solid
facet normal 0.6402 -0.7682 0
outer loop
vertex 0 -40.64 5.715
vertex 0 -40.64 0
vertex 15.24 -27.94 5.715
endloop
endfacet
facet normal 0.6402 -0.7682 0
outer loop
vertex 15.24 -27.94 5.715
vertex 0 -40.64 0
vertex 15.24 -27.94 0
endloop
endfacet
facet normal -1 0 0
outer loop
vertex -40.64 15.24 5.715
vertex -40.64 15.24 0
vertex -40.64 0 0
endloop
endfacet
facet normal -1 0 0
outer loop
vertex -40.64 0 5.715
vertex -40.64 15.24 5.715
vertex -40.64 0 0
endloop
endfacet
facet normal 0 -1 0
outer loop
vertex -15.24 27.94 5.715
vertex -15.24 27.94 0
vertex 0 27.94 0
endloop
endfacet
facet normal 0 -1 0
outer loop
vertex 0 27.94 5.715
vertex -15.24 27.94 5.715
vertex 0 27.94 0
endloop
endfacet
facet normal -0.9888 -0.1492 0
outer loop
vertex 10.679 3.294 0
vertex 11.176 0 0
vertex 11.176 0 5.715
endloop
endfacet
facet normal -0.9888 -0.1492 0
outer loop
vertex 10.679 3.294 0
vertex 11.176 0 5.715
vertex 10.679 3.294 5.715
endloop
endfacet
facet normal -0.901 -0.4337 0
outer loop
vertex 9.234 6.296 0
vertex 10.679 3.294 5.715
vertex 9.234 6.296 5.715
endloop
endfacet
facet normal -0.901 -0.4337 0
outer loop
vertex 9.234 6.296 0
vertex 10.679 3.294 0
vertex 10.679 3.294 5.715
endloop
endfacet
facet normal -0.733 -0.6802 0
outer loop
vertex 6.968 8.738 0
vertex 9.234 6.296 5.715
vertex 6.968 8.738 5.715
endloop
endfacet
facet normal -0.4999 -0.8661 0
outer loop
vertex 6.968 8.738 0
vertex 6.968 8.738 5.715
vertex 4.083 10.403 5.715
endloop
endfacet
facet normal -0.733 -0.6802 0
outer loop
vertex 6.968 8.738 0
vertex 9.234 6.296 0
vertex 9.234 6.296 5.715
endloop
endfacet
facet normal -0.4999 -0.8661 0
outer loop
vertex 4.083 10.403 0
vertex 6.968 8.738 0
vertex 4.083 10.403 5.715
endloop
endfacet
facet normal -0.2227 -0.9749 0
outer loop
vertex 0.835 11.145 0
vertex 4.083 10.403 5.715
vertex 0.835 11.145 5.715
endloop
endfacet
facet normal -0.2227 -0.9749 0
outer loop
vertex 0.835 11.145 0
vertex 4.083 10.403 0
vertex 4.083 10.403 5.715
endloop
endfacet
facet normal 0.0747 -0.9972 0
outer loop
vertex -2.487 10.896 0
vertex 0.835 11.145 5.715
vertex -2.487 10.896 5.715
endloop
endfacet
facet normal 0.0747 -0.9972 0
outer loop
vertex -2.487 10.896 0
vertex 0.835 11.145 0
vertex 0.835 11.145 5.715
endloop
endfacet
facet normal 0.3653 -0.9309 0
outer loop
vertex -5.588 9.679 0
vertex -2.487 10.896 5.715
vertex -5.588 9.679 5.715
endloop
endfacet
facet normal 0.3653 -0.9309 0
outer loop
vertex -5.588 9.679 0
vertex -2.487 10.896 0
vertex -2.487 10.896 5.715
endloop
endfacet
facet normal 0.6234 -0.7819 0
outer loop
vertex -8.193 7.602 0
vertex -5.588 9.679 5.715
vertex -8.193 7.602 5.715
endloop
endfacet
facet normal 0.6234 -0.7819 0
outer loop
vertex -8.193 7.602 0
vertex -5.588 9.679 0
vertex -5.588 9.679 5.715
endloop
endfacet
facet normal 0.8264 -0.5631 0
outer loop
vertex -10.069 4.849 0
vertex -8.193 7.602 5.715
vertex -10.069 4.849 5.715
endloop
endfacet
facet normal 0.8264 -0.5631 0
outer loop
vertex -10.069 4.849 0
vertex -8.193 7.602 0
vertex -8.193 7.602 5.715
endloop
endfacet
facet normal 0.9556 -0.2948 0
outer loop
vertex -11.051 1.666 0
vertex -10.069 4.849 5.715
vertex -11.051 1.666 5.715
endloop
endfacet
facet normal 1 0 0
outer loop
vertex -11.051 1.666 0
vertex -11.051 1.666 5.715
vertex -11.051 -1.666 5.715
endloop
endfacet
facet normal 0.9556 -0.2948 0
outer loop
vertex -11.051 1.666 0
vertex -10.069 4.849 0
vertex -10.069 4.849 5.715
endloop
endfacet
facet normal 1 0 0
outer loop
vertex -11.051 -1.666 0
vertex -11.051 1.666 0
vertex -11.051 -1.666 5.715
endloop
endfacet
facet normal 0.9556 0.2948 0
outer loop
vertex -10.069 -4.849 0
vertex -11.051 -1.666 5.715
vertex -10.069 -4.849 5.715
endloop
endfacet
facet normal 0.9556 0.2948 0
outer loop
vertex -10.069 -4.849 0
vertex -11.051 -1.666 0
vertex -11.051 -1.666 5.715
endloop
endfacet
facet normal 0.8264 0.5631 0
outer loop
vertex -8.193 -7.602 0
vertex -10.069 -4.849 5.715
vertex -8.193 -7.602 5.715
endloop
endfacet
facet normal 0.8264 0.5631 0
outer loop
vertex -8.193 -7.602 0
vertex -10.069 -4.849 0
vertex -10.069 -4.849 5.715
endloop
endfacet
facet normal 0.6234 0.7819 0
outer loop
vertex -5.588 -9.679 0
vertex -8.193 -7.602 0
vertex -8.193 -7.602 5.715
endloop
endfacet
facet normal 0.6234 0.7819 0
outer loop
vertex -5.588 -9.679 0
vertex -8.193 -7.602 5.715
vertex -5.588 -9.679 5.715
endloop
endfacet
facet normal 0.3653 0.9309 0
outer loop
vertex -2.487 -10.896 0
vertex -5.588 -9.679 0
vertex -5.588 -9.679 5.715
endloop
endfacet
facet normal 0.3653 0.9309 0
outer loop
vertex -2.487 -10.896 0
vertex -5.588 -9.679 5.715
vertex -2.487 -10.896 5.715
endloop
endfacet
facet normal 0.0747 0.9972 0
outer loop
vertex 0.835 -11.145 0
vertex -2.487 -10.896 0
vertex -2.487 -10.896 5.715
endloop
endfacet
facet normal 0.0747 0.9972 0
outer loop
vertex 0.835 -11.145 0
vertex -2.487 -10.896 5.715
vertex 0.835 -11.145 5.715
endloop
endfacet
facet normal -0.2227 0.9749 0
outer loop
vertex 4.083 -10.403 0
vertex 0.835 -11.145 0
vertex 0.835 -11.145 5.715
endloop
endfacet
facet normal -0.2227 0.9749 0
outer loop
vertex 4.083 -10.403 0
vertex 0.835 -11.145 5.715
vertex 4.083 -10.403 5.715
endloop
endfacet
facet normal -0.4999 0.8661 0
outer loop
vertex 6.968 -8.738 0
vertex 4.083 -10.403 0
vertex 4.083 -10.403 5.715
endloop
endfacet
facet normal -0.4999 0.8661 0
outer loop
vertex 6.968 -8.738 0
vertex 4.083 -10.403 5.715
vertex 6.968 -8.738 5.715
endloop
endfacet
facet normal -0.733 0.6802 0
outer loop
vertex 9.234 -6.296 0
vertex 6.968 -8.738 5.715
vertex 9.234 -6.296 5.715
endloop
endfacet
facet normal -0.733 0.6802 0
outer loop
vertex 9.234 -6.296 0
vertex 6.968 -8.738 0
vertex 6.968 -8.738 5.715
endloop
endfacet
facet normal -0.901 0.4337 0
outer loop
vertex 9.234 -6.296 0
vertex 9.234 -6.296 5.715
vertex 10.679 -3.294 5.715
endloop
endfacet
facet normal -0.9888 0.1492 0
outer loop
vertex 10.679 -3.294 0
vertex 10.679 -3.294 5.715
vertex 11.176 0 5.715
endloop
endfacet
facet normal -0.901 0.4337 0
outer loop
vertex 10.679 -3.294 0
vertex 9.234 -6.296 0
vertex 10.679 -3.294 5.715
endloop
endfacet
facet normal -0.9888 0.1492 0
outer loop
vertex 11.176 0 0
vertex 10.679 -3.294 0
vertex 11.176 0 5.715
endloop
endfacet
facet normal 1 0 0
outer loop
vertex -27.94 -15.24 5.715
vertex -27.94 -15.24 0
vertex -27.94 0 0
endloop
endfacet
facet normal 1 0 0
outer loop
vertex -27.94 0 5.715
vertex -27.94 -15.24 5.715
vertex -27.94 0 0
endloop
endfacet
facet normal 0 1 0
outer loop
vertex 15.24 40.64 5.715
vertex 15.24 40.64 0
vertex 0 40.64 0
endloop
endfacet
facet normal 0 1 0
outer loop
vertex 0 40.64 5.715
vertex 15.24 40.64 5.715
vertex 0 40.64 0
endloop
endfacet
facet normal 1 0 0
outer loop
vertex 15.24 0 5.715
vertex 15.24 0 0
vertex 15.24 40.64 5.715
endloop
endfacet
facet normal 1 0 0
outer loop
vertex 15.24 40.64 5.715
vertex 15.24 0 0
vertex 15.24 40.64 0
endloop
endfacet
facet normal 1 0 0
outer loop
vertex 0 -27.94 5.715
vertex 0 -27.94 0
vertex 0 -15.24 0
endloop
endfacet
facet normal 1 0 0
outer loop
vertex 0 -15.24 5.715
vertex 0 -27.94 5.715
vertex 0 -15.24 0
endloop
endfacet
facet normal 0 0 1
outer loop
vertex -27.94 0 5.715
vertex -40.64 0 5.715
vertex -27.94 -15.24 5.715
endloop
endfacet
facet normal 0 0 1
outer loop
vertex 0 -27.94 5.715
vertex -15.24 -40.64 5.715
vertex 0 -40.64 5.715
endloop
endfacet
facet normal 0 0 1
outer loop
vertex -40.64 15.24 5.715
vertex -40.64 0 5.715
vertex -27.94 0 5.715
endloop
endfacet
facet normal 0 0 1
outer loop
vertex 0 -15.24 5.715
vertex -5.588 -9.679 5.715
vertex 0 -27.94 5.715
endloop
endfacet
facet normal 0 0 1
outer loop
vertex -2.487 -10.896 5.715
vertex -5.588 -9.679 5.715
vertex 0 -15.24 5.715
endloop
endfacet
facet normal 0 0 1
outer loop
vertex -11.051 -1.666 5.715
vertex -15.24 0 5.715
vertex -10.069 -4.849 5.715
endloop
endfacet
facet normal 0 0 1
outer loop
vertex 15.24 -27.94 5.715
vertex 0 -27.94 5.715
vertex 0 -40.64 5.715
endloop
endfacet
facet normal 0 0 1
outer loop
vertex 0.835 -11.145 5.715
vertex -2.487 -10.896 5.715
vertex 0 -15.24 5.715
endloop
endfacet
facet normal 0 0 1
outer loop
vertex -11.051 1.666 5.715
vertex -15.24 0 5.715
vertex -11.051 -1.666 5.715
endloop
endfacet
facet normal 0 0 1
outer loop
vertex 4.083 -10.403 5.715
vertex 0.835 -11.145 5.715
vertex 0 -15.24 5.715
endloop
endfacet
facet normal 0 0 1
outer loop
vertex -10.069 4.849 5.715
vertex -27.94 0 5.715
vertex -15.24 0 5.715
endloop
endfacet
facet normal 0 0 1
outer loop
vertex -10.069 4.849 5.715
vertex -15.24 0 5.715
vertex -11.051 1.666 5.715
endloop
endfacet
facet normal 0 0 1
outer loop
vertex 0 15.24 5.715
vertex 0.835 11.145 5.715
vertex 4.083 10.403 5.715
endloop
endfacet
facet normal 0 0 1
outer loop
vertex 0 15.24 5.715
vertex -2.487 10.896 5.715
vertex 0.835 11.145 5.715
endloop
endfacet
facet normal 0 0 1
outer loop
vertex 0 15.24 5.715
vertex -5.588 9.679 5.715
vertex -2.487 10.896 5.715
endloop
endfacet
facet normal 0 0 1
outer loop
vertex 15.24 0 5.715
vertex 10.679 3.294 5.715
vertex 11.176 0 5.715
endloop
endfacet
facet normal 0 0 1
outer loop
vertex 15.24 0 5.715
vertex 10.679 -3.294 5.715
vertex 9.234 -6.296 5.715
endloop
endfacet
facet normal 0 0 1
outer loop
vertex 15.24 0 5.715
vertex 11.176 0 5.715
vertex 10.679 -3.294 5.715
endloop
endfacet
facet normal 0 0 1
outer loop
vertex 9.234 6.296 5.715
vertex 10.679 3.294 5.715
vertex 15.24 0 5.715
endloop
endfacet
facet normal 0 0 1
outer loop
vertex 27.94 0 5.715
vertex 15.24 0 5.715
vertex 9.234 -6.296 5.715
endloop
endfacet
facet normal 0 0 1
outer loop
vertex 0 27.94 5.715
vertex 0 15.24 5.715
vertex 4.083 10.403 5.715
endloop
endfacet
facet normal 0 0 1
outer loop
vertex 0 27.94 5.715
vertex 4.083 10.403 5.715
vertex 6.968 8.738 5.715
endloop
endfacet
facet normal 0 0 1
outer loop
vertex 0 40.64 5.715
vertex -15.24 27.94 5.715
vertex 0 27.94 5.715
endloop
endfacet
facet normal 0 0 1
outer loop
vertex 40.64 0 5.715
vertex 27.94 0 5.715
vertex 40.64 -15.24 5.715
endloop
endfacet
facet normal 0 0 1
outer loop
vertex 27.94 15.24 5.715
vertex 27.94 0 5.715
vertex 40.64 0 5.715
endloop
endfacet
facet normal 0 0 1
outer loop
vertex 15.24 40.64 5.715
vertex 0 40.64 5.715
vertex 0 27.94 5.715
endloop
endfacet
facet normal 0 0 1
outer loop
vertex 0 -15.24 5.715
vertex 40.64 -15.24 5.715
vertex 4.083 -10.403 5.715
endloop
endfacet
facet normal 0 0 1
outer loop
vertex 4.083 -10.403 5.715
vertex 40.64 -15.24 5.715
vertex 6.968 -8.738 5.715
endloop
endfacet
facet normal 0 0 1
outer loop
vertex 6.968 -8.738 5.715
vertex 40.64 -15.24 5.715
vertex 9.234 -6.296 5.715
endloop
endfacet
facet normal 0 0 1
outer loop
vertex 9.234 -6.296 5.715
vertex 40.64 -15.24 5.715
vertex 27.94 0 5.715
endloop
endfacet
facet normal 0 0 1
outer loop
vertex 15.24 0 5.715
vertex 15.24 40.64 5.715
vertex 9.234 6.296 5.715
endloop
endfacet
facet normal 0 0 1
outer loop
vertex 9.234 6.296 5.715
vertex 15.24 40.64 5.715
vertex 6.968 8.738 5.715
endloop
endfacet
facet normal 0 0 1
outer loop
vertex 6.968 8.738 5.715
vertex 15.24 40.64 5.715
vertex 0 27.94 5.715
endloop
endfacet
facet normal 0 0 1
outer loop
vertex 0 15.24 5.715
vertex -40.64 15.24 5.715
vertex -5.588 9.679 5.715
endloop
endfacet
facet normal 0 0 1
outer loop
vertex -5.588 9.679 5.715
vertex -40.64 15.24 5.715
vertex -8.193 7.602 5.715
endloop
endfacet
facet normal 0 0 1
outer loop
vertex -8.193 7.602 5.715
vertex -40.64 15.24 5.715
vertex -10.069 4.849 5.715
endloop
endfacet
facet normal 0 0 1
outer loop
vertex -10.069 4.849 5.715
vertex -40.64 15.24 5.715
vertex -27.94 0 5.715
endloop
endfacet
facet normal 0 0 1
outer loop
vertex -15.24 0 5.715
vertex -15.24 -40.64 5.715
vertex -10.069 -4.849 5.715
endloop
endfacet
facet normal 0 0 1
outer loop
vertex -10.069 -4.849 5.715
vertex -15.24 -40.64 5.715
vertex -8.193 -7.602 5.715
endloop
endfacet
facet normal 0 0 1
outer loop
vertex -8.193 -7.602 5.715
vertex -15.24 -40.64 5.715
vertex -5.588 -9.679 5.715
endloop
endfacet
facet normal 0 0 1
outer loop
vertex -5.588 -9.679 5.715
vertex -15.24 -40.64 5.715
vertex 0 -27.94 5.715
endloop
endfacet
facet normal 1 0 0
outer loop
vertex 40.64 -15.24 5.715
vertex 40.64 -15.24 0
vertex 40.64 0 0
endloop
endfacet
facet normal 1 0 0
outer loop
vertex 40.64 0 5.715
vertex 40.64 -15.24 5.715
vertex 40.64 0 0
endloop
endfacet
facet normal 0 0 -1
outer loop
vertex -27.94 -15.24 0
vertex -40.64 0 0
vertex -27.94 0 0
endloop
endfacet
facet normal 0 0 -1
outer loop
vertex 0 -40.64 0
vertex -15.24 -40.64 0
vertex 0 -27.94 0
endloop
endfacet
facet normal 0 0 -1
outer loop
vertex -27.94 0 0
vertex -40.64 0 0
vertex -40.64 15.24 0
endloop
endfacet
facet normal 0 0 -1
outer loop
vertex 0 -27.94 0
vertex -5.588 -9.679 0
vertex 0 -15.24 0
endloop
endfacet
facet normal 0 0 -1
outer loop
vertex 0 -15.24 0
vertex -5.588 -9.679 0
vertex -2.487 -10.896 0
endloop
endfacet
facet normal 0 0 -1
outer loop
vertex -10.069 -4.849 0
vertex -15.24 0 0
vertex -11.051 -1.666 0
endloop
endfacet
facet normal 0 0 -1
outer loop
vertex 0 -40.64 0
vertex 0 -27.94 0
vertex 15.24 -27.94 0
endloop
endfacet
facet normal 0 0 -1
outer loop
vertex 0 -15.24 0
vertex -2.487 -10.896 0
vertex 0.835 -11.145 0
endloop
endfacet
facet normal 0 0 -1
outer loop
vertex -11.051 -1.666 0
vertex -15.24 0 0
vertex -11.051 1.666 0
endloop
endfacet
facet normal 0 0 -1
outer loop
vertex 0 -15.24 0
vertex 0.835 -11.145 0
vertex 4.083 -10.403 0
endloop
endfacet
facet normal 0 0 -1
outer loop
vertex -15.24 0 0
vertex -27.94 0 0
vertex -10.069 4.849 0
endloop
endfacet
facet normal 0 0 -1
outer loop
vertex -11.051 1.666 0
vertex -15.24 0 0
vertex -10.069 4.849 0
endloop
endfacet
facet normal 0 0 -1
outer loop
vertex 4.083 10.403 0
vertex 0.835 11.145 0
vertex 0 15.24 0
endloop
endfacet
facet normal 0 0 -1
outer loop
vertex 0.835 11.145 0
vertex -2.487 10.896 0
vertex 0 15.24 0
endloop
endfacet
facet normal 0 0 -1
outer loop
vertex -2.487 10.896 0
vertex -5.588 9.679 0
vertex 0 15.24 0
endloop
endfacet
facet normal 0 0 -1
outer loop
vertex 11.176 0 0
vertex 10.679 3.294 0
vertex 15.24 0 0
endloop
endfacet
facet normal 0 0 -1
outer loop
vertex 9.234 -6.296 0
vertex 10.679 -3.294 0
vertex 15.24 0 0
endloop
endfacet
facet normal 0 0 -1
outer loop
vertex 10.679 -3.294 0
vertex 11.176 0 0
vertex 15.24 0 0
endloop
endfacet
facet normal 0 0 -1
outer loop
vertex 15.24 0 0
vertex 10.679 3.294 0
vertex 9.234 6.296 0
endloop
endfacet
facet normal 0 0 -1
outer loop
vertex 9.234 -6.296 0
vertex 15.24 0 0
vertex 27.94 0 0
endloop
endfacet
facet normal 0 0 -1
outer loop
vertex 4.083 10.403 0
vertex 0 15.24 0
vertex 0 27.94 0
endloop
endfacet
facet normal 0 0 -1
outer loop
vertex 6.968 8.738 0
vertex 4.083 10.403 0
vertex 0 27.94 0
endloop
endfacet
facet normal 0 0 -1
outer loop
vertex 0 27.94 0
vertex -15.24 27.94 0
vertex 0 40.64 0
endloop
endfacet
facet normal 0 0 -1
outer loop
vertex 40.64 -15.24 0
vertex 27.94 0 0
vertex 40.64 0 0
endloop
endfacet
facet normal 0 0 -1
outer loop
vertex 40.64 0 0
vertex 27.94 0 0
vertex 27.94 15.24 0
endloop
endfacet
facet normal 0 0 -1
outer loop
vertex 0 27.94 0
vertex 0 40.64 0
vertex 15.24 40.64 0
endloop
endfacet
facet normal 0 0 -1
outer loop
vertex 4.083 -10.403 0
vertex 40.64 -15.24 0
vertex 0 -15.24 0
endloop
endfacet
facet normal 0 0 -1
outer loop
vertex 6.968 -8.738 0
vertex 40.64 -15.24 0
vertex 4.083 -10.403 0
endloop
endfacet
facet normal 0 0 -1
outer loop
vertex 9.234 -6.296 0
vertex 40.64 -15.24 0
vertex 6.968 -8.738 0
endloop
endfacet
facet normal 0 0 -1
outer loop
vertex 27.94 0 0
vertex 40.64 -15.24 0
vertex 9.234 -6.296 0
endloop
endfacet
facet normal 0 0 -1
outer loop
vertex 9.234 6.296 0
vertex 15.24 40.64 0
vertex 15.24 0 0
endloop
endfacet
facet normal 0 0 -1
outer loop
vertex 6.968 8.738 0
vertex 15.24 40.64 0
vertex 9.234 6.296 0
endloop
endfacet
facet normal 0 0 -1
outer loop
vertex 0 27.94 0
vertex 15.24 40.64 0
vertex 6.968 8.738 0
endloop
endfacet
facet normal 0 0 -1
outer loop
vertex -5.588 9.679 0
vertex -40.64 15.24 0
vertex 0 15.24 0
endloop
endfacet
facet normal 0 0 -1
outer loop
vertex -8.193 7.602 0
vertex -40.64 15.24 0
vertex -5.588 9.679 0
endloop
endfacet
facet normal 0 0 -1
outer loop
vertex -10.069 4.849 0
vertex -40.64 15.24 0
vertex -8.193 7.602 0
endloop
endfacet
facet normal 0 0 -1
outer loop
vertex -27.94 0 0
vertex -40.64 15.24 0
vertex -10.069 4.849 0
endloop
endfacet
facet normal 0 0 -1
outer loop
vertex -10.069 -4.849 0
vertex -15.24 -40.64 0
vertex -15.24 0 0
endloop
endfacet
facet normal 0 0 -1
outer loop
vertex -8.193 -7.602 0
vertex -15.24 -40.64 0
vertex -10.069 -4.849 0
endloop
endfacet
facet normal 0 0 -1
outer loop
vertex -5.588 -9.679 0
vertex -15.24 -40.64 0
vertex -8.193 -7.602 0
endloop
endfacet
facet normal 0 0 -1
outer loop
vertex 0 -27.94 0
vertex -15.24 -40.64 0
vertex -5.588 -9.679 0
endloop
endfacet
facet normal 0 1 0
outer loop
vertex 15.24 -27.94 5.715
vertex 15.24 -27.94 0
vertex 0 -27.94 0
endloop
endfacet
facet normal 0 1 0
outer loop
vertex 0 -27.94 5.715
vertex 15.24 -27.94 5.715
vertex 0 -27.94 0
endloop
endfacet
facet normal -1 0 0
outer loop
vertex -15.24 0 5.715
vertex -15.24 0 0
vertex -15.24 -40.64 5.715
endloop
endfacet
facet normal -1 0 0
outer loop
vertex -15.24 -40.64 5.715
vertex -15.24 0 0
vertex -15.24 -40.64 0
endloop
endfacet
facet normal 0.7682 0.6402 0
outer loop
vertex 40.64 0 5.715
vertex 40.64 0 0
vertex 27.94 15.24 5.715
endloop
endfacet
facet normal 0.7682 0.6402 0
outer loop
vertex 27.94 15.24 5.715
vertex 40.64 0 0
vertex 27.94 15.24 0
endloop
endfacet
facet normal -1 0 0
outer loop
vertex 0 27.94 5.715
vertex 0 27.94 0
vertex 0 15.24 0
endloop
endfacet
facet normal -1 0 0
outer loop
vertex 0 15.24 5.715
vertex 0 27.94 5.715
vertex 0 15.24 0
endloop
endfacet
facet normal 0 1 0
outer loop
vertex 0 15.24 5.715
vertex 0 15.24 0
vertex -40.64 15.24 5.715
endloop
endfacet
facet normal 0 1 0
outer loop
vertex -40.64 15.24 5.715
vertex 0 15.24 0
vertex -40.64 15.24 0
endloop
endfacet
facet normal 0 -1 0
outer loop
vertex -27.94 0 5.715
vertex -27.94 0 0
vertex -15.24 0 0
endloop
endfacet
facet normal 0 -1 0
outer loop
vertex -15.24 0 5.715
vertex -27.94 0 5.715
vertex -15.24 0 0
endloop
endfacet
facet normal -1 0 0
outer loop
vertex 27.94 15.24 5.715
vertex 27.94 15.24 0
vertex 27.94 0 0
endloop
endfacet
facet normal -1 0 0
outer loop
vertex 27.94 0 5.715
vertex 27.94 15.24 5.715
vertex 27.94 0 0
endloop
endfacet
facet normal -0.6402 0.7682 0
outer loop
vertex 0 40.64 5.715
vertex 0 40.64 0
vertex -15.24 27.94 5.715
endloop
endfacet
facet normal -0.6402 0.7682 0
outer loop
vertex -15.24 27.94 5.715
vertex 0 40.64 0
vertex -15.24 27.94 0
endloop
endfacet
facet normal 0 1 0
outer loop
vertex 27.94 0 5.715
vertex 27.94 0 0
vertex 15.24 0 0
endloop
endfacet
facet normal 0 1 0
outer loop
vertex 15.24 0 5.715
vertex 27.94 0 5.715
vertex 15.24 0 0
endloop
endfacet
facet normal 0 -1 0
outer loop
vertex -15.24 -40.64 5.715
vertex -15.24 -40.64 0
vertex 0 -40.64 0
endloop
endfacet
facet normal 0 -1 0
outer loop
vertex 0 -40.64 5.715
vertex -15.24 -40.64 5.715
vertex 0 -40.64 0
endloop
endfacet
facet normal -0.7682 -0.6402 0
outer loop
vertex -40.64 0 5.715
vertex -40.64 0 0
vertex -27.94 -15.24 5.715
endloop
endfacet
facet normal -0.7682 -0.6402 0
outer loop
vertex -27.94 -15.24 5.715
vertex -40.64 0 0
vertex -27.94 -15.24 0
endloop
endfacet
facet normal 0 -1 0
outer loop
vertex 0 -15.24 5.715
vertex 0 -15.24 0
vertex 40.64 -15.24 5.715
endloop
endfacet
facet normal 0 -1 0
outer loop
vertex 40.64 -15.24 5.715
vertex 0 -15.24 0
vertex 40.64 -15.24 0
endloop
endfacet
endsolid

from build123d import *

# Parameters (mm, degrees)
F0_R     = 11.176
F1_DEPTH = 5.715
F2_DEPTH = 5.715


# Not quite as in the source:
# - a feature names something its author has since deleted; it is built from what else it names


with BuildPart() as f1:
    # F0 (on Top) → F1 (new body)
    with BuildSketch(Plane.XY):
        with BuildLine():
            ThreePointArc((0, -15.24), (10.7763073453, -10.7763073453), (15.24, 0))
            ThreePointArc((15.24, 0), (10.7763073453, 10.7763073453), (0, 15.24))
            ThreePointArc((0, 15.24), (-10.7763073453, 10.7763073453), (-15.24, 0))
            ThreePointArc((-15.24, 0), (-10.7763073453, -10.7763073453), (0, -15.24))
        make_face()
        Circle(F0_R, mode=Mode.SUBTRACT)
        with BuildLine():
            Line((27.94, 0), (15.24, 0))
            ThreePointArc((15.24, 0), (10.7763073453, -10.7763073453), (0, -15.24))
            Line((0, -15.24), (40.64, -15.24))
            Line((40.64, -15.24), (40.64, 0))
            Line((40.64, 0), (27.94, 0))
        make_face()
        with BuildLine():
            ThreePointArc((0, 15.24), (10.7763073453, 10.7763073453), (15.24, 0))
            Line((15.24, 0), (15.24, 40.64))
            Line((15.24, 40.64), (0, 40.64))
            Line((0, 40.64), (0, 27.94))
            Line((0, 27.94), (0, 15.24))
        make_face()
        with BuildLine():
            ThreePointArc((-15.24, 0), (-10.7763073453, 10.7763073453), (0, 15.24))
            Line((0, 15.24), (-40.64, 15.24))
            Line((-40.64, 15.24), (-40.64, 0))
            Line((-40.64, 0), (-27.94, 0))
            Line((-27.94, 0), (-15.24, 0))
        make_face()
        with BuildLine():
            Line((0, -27.94), (0, -15.24))
            ThreePointArc((0, -15.24), (-10.7763073453, -10.7763073453), (-15.24, 0))
            Line((-15.24, 0), (-15.24, -40.64))
            Line((-15.24, -40.64), (0, -40.64))
            Line((0, -40.64), (0, -27.94))
        make_face()
    extrude(amount=F1_DEPTH)

    # F0 (on Top) → F2 (join)
    with BuildSketch(Plane.XY):
        with BuildLine():
            ThreePointArc((0, -15.24), (10.7763073453, -10.7763073453), (15.24, 0))
            ThreePointArc((15.24, 0), (10.7763073453, 10.7763073453), (0, 15.24))
            ThreePointArc((0, 15.24), (-10.7763073453, 10.7763073453), (-15.24, 0))
            ThreePointArc((-15.24, 0), (-10.7763073453, -10.7763073453), (0, -15.24))
        make_face()
        Circle(F0_R, mode=Mode.SUBTRACT)
        with BuildLine():
            Line((27.94, 0), (15.24, 0))
            ThreePointArc((15.24, 0), (10.7763073453, -10.7763073453), (0, -15.24))
            Line((0, -15.24), (40.64, -15.24))
            Line((40.64, -15.24), (40.64, 0))
            Line((40.64, 0), (27.94, 0))
        make_face()
        with BuildLine():
            ThreePointArc((0, 15.24), (10.7763073453, 10.7763073453), (15.24, 0))
            Line((15.24, 0), (15.24, 40.64))
            Line((15.24, 40.64), (0, 40.64))
            Line((0, 40.64), (0, 27.94))
            Line((0, 27.94), (0, 15.24))
        make_face()
        with BuildLine():
            ThreePointArc((-15.24, 0), (-10.7763073453, 10.7763073453), (0, 15.24))
            Line((0, 15.24), (-40.64, 15.24))
            Line((-40.64, 15.24), (-40.64, 0))
            Line((-40.64, 0), (-27.94, 0))
            Line((-27.94, 0), (-15.24, 0))
        make_face()
        with BuildLine():
            Line((0, -27.94), (0, -15.24))
            ThreePointArc((0, -15.24), (-10.7763073453, -10.7763073453), (-15.24, 0))
            Line((-15.24, 0), (-15.24, -40.64))
            Line((-15.24, -40.64), (0, -40.64))
            Line((0, -40.64), (0, -27.94))
        make_face()
        Polygon((27.94, 15.24), (27.94, 0), (40.64, 0), align=None)
        Polygon((-15.24, 27.94), (0, 27.94), (0, 40.64), align=None)
        Polygon((15.24, -27.94), (0, -27.94), (0, -40.64), align=None)
        Polygon((-27.94, -15.24), (-27.94, 0), (-40.64, 0), align=None)
    extrude(amount=F2_DEPTH)


solid = f1.part
